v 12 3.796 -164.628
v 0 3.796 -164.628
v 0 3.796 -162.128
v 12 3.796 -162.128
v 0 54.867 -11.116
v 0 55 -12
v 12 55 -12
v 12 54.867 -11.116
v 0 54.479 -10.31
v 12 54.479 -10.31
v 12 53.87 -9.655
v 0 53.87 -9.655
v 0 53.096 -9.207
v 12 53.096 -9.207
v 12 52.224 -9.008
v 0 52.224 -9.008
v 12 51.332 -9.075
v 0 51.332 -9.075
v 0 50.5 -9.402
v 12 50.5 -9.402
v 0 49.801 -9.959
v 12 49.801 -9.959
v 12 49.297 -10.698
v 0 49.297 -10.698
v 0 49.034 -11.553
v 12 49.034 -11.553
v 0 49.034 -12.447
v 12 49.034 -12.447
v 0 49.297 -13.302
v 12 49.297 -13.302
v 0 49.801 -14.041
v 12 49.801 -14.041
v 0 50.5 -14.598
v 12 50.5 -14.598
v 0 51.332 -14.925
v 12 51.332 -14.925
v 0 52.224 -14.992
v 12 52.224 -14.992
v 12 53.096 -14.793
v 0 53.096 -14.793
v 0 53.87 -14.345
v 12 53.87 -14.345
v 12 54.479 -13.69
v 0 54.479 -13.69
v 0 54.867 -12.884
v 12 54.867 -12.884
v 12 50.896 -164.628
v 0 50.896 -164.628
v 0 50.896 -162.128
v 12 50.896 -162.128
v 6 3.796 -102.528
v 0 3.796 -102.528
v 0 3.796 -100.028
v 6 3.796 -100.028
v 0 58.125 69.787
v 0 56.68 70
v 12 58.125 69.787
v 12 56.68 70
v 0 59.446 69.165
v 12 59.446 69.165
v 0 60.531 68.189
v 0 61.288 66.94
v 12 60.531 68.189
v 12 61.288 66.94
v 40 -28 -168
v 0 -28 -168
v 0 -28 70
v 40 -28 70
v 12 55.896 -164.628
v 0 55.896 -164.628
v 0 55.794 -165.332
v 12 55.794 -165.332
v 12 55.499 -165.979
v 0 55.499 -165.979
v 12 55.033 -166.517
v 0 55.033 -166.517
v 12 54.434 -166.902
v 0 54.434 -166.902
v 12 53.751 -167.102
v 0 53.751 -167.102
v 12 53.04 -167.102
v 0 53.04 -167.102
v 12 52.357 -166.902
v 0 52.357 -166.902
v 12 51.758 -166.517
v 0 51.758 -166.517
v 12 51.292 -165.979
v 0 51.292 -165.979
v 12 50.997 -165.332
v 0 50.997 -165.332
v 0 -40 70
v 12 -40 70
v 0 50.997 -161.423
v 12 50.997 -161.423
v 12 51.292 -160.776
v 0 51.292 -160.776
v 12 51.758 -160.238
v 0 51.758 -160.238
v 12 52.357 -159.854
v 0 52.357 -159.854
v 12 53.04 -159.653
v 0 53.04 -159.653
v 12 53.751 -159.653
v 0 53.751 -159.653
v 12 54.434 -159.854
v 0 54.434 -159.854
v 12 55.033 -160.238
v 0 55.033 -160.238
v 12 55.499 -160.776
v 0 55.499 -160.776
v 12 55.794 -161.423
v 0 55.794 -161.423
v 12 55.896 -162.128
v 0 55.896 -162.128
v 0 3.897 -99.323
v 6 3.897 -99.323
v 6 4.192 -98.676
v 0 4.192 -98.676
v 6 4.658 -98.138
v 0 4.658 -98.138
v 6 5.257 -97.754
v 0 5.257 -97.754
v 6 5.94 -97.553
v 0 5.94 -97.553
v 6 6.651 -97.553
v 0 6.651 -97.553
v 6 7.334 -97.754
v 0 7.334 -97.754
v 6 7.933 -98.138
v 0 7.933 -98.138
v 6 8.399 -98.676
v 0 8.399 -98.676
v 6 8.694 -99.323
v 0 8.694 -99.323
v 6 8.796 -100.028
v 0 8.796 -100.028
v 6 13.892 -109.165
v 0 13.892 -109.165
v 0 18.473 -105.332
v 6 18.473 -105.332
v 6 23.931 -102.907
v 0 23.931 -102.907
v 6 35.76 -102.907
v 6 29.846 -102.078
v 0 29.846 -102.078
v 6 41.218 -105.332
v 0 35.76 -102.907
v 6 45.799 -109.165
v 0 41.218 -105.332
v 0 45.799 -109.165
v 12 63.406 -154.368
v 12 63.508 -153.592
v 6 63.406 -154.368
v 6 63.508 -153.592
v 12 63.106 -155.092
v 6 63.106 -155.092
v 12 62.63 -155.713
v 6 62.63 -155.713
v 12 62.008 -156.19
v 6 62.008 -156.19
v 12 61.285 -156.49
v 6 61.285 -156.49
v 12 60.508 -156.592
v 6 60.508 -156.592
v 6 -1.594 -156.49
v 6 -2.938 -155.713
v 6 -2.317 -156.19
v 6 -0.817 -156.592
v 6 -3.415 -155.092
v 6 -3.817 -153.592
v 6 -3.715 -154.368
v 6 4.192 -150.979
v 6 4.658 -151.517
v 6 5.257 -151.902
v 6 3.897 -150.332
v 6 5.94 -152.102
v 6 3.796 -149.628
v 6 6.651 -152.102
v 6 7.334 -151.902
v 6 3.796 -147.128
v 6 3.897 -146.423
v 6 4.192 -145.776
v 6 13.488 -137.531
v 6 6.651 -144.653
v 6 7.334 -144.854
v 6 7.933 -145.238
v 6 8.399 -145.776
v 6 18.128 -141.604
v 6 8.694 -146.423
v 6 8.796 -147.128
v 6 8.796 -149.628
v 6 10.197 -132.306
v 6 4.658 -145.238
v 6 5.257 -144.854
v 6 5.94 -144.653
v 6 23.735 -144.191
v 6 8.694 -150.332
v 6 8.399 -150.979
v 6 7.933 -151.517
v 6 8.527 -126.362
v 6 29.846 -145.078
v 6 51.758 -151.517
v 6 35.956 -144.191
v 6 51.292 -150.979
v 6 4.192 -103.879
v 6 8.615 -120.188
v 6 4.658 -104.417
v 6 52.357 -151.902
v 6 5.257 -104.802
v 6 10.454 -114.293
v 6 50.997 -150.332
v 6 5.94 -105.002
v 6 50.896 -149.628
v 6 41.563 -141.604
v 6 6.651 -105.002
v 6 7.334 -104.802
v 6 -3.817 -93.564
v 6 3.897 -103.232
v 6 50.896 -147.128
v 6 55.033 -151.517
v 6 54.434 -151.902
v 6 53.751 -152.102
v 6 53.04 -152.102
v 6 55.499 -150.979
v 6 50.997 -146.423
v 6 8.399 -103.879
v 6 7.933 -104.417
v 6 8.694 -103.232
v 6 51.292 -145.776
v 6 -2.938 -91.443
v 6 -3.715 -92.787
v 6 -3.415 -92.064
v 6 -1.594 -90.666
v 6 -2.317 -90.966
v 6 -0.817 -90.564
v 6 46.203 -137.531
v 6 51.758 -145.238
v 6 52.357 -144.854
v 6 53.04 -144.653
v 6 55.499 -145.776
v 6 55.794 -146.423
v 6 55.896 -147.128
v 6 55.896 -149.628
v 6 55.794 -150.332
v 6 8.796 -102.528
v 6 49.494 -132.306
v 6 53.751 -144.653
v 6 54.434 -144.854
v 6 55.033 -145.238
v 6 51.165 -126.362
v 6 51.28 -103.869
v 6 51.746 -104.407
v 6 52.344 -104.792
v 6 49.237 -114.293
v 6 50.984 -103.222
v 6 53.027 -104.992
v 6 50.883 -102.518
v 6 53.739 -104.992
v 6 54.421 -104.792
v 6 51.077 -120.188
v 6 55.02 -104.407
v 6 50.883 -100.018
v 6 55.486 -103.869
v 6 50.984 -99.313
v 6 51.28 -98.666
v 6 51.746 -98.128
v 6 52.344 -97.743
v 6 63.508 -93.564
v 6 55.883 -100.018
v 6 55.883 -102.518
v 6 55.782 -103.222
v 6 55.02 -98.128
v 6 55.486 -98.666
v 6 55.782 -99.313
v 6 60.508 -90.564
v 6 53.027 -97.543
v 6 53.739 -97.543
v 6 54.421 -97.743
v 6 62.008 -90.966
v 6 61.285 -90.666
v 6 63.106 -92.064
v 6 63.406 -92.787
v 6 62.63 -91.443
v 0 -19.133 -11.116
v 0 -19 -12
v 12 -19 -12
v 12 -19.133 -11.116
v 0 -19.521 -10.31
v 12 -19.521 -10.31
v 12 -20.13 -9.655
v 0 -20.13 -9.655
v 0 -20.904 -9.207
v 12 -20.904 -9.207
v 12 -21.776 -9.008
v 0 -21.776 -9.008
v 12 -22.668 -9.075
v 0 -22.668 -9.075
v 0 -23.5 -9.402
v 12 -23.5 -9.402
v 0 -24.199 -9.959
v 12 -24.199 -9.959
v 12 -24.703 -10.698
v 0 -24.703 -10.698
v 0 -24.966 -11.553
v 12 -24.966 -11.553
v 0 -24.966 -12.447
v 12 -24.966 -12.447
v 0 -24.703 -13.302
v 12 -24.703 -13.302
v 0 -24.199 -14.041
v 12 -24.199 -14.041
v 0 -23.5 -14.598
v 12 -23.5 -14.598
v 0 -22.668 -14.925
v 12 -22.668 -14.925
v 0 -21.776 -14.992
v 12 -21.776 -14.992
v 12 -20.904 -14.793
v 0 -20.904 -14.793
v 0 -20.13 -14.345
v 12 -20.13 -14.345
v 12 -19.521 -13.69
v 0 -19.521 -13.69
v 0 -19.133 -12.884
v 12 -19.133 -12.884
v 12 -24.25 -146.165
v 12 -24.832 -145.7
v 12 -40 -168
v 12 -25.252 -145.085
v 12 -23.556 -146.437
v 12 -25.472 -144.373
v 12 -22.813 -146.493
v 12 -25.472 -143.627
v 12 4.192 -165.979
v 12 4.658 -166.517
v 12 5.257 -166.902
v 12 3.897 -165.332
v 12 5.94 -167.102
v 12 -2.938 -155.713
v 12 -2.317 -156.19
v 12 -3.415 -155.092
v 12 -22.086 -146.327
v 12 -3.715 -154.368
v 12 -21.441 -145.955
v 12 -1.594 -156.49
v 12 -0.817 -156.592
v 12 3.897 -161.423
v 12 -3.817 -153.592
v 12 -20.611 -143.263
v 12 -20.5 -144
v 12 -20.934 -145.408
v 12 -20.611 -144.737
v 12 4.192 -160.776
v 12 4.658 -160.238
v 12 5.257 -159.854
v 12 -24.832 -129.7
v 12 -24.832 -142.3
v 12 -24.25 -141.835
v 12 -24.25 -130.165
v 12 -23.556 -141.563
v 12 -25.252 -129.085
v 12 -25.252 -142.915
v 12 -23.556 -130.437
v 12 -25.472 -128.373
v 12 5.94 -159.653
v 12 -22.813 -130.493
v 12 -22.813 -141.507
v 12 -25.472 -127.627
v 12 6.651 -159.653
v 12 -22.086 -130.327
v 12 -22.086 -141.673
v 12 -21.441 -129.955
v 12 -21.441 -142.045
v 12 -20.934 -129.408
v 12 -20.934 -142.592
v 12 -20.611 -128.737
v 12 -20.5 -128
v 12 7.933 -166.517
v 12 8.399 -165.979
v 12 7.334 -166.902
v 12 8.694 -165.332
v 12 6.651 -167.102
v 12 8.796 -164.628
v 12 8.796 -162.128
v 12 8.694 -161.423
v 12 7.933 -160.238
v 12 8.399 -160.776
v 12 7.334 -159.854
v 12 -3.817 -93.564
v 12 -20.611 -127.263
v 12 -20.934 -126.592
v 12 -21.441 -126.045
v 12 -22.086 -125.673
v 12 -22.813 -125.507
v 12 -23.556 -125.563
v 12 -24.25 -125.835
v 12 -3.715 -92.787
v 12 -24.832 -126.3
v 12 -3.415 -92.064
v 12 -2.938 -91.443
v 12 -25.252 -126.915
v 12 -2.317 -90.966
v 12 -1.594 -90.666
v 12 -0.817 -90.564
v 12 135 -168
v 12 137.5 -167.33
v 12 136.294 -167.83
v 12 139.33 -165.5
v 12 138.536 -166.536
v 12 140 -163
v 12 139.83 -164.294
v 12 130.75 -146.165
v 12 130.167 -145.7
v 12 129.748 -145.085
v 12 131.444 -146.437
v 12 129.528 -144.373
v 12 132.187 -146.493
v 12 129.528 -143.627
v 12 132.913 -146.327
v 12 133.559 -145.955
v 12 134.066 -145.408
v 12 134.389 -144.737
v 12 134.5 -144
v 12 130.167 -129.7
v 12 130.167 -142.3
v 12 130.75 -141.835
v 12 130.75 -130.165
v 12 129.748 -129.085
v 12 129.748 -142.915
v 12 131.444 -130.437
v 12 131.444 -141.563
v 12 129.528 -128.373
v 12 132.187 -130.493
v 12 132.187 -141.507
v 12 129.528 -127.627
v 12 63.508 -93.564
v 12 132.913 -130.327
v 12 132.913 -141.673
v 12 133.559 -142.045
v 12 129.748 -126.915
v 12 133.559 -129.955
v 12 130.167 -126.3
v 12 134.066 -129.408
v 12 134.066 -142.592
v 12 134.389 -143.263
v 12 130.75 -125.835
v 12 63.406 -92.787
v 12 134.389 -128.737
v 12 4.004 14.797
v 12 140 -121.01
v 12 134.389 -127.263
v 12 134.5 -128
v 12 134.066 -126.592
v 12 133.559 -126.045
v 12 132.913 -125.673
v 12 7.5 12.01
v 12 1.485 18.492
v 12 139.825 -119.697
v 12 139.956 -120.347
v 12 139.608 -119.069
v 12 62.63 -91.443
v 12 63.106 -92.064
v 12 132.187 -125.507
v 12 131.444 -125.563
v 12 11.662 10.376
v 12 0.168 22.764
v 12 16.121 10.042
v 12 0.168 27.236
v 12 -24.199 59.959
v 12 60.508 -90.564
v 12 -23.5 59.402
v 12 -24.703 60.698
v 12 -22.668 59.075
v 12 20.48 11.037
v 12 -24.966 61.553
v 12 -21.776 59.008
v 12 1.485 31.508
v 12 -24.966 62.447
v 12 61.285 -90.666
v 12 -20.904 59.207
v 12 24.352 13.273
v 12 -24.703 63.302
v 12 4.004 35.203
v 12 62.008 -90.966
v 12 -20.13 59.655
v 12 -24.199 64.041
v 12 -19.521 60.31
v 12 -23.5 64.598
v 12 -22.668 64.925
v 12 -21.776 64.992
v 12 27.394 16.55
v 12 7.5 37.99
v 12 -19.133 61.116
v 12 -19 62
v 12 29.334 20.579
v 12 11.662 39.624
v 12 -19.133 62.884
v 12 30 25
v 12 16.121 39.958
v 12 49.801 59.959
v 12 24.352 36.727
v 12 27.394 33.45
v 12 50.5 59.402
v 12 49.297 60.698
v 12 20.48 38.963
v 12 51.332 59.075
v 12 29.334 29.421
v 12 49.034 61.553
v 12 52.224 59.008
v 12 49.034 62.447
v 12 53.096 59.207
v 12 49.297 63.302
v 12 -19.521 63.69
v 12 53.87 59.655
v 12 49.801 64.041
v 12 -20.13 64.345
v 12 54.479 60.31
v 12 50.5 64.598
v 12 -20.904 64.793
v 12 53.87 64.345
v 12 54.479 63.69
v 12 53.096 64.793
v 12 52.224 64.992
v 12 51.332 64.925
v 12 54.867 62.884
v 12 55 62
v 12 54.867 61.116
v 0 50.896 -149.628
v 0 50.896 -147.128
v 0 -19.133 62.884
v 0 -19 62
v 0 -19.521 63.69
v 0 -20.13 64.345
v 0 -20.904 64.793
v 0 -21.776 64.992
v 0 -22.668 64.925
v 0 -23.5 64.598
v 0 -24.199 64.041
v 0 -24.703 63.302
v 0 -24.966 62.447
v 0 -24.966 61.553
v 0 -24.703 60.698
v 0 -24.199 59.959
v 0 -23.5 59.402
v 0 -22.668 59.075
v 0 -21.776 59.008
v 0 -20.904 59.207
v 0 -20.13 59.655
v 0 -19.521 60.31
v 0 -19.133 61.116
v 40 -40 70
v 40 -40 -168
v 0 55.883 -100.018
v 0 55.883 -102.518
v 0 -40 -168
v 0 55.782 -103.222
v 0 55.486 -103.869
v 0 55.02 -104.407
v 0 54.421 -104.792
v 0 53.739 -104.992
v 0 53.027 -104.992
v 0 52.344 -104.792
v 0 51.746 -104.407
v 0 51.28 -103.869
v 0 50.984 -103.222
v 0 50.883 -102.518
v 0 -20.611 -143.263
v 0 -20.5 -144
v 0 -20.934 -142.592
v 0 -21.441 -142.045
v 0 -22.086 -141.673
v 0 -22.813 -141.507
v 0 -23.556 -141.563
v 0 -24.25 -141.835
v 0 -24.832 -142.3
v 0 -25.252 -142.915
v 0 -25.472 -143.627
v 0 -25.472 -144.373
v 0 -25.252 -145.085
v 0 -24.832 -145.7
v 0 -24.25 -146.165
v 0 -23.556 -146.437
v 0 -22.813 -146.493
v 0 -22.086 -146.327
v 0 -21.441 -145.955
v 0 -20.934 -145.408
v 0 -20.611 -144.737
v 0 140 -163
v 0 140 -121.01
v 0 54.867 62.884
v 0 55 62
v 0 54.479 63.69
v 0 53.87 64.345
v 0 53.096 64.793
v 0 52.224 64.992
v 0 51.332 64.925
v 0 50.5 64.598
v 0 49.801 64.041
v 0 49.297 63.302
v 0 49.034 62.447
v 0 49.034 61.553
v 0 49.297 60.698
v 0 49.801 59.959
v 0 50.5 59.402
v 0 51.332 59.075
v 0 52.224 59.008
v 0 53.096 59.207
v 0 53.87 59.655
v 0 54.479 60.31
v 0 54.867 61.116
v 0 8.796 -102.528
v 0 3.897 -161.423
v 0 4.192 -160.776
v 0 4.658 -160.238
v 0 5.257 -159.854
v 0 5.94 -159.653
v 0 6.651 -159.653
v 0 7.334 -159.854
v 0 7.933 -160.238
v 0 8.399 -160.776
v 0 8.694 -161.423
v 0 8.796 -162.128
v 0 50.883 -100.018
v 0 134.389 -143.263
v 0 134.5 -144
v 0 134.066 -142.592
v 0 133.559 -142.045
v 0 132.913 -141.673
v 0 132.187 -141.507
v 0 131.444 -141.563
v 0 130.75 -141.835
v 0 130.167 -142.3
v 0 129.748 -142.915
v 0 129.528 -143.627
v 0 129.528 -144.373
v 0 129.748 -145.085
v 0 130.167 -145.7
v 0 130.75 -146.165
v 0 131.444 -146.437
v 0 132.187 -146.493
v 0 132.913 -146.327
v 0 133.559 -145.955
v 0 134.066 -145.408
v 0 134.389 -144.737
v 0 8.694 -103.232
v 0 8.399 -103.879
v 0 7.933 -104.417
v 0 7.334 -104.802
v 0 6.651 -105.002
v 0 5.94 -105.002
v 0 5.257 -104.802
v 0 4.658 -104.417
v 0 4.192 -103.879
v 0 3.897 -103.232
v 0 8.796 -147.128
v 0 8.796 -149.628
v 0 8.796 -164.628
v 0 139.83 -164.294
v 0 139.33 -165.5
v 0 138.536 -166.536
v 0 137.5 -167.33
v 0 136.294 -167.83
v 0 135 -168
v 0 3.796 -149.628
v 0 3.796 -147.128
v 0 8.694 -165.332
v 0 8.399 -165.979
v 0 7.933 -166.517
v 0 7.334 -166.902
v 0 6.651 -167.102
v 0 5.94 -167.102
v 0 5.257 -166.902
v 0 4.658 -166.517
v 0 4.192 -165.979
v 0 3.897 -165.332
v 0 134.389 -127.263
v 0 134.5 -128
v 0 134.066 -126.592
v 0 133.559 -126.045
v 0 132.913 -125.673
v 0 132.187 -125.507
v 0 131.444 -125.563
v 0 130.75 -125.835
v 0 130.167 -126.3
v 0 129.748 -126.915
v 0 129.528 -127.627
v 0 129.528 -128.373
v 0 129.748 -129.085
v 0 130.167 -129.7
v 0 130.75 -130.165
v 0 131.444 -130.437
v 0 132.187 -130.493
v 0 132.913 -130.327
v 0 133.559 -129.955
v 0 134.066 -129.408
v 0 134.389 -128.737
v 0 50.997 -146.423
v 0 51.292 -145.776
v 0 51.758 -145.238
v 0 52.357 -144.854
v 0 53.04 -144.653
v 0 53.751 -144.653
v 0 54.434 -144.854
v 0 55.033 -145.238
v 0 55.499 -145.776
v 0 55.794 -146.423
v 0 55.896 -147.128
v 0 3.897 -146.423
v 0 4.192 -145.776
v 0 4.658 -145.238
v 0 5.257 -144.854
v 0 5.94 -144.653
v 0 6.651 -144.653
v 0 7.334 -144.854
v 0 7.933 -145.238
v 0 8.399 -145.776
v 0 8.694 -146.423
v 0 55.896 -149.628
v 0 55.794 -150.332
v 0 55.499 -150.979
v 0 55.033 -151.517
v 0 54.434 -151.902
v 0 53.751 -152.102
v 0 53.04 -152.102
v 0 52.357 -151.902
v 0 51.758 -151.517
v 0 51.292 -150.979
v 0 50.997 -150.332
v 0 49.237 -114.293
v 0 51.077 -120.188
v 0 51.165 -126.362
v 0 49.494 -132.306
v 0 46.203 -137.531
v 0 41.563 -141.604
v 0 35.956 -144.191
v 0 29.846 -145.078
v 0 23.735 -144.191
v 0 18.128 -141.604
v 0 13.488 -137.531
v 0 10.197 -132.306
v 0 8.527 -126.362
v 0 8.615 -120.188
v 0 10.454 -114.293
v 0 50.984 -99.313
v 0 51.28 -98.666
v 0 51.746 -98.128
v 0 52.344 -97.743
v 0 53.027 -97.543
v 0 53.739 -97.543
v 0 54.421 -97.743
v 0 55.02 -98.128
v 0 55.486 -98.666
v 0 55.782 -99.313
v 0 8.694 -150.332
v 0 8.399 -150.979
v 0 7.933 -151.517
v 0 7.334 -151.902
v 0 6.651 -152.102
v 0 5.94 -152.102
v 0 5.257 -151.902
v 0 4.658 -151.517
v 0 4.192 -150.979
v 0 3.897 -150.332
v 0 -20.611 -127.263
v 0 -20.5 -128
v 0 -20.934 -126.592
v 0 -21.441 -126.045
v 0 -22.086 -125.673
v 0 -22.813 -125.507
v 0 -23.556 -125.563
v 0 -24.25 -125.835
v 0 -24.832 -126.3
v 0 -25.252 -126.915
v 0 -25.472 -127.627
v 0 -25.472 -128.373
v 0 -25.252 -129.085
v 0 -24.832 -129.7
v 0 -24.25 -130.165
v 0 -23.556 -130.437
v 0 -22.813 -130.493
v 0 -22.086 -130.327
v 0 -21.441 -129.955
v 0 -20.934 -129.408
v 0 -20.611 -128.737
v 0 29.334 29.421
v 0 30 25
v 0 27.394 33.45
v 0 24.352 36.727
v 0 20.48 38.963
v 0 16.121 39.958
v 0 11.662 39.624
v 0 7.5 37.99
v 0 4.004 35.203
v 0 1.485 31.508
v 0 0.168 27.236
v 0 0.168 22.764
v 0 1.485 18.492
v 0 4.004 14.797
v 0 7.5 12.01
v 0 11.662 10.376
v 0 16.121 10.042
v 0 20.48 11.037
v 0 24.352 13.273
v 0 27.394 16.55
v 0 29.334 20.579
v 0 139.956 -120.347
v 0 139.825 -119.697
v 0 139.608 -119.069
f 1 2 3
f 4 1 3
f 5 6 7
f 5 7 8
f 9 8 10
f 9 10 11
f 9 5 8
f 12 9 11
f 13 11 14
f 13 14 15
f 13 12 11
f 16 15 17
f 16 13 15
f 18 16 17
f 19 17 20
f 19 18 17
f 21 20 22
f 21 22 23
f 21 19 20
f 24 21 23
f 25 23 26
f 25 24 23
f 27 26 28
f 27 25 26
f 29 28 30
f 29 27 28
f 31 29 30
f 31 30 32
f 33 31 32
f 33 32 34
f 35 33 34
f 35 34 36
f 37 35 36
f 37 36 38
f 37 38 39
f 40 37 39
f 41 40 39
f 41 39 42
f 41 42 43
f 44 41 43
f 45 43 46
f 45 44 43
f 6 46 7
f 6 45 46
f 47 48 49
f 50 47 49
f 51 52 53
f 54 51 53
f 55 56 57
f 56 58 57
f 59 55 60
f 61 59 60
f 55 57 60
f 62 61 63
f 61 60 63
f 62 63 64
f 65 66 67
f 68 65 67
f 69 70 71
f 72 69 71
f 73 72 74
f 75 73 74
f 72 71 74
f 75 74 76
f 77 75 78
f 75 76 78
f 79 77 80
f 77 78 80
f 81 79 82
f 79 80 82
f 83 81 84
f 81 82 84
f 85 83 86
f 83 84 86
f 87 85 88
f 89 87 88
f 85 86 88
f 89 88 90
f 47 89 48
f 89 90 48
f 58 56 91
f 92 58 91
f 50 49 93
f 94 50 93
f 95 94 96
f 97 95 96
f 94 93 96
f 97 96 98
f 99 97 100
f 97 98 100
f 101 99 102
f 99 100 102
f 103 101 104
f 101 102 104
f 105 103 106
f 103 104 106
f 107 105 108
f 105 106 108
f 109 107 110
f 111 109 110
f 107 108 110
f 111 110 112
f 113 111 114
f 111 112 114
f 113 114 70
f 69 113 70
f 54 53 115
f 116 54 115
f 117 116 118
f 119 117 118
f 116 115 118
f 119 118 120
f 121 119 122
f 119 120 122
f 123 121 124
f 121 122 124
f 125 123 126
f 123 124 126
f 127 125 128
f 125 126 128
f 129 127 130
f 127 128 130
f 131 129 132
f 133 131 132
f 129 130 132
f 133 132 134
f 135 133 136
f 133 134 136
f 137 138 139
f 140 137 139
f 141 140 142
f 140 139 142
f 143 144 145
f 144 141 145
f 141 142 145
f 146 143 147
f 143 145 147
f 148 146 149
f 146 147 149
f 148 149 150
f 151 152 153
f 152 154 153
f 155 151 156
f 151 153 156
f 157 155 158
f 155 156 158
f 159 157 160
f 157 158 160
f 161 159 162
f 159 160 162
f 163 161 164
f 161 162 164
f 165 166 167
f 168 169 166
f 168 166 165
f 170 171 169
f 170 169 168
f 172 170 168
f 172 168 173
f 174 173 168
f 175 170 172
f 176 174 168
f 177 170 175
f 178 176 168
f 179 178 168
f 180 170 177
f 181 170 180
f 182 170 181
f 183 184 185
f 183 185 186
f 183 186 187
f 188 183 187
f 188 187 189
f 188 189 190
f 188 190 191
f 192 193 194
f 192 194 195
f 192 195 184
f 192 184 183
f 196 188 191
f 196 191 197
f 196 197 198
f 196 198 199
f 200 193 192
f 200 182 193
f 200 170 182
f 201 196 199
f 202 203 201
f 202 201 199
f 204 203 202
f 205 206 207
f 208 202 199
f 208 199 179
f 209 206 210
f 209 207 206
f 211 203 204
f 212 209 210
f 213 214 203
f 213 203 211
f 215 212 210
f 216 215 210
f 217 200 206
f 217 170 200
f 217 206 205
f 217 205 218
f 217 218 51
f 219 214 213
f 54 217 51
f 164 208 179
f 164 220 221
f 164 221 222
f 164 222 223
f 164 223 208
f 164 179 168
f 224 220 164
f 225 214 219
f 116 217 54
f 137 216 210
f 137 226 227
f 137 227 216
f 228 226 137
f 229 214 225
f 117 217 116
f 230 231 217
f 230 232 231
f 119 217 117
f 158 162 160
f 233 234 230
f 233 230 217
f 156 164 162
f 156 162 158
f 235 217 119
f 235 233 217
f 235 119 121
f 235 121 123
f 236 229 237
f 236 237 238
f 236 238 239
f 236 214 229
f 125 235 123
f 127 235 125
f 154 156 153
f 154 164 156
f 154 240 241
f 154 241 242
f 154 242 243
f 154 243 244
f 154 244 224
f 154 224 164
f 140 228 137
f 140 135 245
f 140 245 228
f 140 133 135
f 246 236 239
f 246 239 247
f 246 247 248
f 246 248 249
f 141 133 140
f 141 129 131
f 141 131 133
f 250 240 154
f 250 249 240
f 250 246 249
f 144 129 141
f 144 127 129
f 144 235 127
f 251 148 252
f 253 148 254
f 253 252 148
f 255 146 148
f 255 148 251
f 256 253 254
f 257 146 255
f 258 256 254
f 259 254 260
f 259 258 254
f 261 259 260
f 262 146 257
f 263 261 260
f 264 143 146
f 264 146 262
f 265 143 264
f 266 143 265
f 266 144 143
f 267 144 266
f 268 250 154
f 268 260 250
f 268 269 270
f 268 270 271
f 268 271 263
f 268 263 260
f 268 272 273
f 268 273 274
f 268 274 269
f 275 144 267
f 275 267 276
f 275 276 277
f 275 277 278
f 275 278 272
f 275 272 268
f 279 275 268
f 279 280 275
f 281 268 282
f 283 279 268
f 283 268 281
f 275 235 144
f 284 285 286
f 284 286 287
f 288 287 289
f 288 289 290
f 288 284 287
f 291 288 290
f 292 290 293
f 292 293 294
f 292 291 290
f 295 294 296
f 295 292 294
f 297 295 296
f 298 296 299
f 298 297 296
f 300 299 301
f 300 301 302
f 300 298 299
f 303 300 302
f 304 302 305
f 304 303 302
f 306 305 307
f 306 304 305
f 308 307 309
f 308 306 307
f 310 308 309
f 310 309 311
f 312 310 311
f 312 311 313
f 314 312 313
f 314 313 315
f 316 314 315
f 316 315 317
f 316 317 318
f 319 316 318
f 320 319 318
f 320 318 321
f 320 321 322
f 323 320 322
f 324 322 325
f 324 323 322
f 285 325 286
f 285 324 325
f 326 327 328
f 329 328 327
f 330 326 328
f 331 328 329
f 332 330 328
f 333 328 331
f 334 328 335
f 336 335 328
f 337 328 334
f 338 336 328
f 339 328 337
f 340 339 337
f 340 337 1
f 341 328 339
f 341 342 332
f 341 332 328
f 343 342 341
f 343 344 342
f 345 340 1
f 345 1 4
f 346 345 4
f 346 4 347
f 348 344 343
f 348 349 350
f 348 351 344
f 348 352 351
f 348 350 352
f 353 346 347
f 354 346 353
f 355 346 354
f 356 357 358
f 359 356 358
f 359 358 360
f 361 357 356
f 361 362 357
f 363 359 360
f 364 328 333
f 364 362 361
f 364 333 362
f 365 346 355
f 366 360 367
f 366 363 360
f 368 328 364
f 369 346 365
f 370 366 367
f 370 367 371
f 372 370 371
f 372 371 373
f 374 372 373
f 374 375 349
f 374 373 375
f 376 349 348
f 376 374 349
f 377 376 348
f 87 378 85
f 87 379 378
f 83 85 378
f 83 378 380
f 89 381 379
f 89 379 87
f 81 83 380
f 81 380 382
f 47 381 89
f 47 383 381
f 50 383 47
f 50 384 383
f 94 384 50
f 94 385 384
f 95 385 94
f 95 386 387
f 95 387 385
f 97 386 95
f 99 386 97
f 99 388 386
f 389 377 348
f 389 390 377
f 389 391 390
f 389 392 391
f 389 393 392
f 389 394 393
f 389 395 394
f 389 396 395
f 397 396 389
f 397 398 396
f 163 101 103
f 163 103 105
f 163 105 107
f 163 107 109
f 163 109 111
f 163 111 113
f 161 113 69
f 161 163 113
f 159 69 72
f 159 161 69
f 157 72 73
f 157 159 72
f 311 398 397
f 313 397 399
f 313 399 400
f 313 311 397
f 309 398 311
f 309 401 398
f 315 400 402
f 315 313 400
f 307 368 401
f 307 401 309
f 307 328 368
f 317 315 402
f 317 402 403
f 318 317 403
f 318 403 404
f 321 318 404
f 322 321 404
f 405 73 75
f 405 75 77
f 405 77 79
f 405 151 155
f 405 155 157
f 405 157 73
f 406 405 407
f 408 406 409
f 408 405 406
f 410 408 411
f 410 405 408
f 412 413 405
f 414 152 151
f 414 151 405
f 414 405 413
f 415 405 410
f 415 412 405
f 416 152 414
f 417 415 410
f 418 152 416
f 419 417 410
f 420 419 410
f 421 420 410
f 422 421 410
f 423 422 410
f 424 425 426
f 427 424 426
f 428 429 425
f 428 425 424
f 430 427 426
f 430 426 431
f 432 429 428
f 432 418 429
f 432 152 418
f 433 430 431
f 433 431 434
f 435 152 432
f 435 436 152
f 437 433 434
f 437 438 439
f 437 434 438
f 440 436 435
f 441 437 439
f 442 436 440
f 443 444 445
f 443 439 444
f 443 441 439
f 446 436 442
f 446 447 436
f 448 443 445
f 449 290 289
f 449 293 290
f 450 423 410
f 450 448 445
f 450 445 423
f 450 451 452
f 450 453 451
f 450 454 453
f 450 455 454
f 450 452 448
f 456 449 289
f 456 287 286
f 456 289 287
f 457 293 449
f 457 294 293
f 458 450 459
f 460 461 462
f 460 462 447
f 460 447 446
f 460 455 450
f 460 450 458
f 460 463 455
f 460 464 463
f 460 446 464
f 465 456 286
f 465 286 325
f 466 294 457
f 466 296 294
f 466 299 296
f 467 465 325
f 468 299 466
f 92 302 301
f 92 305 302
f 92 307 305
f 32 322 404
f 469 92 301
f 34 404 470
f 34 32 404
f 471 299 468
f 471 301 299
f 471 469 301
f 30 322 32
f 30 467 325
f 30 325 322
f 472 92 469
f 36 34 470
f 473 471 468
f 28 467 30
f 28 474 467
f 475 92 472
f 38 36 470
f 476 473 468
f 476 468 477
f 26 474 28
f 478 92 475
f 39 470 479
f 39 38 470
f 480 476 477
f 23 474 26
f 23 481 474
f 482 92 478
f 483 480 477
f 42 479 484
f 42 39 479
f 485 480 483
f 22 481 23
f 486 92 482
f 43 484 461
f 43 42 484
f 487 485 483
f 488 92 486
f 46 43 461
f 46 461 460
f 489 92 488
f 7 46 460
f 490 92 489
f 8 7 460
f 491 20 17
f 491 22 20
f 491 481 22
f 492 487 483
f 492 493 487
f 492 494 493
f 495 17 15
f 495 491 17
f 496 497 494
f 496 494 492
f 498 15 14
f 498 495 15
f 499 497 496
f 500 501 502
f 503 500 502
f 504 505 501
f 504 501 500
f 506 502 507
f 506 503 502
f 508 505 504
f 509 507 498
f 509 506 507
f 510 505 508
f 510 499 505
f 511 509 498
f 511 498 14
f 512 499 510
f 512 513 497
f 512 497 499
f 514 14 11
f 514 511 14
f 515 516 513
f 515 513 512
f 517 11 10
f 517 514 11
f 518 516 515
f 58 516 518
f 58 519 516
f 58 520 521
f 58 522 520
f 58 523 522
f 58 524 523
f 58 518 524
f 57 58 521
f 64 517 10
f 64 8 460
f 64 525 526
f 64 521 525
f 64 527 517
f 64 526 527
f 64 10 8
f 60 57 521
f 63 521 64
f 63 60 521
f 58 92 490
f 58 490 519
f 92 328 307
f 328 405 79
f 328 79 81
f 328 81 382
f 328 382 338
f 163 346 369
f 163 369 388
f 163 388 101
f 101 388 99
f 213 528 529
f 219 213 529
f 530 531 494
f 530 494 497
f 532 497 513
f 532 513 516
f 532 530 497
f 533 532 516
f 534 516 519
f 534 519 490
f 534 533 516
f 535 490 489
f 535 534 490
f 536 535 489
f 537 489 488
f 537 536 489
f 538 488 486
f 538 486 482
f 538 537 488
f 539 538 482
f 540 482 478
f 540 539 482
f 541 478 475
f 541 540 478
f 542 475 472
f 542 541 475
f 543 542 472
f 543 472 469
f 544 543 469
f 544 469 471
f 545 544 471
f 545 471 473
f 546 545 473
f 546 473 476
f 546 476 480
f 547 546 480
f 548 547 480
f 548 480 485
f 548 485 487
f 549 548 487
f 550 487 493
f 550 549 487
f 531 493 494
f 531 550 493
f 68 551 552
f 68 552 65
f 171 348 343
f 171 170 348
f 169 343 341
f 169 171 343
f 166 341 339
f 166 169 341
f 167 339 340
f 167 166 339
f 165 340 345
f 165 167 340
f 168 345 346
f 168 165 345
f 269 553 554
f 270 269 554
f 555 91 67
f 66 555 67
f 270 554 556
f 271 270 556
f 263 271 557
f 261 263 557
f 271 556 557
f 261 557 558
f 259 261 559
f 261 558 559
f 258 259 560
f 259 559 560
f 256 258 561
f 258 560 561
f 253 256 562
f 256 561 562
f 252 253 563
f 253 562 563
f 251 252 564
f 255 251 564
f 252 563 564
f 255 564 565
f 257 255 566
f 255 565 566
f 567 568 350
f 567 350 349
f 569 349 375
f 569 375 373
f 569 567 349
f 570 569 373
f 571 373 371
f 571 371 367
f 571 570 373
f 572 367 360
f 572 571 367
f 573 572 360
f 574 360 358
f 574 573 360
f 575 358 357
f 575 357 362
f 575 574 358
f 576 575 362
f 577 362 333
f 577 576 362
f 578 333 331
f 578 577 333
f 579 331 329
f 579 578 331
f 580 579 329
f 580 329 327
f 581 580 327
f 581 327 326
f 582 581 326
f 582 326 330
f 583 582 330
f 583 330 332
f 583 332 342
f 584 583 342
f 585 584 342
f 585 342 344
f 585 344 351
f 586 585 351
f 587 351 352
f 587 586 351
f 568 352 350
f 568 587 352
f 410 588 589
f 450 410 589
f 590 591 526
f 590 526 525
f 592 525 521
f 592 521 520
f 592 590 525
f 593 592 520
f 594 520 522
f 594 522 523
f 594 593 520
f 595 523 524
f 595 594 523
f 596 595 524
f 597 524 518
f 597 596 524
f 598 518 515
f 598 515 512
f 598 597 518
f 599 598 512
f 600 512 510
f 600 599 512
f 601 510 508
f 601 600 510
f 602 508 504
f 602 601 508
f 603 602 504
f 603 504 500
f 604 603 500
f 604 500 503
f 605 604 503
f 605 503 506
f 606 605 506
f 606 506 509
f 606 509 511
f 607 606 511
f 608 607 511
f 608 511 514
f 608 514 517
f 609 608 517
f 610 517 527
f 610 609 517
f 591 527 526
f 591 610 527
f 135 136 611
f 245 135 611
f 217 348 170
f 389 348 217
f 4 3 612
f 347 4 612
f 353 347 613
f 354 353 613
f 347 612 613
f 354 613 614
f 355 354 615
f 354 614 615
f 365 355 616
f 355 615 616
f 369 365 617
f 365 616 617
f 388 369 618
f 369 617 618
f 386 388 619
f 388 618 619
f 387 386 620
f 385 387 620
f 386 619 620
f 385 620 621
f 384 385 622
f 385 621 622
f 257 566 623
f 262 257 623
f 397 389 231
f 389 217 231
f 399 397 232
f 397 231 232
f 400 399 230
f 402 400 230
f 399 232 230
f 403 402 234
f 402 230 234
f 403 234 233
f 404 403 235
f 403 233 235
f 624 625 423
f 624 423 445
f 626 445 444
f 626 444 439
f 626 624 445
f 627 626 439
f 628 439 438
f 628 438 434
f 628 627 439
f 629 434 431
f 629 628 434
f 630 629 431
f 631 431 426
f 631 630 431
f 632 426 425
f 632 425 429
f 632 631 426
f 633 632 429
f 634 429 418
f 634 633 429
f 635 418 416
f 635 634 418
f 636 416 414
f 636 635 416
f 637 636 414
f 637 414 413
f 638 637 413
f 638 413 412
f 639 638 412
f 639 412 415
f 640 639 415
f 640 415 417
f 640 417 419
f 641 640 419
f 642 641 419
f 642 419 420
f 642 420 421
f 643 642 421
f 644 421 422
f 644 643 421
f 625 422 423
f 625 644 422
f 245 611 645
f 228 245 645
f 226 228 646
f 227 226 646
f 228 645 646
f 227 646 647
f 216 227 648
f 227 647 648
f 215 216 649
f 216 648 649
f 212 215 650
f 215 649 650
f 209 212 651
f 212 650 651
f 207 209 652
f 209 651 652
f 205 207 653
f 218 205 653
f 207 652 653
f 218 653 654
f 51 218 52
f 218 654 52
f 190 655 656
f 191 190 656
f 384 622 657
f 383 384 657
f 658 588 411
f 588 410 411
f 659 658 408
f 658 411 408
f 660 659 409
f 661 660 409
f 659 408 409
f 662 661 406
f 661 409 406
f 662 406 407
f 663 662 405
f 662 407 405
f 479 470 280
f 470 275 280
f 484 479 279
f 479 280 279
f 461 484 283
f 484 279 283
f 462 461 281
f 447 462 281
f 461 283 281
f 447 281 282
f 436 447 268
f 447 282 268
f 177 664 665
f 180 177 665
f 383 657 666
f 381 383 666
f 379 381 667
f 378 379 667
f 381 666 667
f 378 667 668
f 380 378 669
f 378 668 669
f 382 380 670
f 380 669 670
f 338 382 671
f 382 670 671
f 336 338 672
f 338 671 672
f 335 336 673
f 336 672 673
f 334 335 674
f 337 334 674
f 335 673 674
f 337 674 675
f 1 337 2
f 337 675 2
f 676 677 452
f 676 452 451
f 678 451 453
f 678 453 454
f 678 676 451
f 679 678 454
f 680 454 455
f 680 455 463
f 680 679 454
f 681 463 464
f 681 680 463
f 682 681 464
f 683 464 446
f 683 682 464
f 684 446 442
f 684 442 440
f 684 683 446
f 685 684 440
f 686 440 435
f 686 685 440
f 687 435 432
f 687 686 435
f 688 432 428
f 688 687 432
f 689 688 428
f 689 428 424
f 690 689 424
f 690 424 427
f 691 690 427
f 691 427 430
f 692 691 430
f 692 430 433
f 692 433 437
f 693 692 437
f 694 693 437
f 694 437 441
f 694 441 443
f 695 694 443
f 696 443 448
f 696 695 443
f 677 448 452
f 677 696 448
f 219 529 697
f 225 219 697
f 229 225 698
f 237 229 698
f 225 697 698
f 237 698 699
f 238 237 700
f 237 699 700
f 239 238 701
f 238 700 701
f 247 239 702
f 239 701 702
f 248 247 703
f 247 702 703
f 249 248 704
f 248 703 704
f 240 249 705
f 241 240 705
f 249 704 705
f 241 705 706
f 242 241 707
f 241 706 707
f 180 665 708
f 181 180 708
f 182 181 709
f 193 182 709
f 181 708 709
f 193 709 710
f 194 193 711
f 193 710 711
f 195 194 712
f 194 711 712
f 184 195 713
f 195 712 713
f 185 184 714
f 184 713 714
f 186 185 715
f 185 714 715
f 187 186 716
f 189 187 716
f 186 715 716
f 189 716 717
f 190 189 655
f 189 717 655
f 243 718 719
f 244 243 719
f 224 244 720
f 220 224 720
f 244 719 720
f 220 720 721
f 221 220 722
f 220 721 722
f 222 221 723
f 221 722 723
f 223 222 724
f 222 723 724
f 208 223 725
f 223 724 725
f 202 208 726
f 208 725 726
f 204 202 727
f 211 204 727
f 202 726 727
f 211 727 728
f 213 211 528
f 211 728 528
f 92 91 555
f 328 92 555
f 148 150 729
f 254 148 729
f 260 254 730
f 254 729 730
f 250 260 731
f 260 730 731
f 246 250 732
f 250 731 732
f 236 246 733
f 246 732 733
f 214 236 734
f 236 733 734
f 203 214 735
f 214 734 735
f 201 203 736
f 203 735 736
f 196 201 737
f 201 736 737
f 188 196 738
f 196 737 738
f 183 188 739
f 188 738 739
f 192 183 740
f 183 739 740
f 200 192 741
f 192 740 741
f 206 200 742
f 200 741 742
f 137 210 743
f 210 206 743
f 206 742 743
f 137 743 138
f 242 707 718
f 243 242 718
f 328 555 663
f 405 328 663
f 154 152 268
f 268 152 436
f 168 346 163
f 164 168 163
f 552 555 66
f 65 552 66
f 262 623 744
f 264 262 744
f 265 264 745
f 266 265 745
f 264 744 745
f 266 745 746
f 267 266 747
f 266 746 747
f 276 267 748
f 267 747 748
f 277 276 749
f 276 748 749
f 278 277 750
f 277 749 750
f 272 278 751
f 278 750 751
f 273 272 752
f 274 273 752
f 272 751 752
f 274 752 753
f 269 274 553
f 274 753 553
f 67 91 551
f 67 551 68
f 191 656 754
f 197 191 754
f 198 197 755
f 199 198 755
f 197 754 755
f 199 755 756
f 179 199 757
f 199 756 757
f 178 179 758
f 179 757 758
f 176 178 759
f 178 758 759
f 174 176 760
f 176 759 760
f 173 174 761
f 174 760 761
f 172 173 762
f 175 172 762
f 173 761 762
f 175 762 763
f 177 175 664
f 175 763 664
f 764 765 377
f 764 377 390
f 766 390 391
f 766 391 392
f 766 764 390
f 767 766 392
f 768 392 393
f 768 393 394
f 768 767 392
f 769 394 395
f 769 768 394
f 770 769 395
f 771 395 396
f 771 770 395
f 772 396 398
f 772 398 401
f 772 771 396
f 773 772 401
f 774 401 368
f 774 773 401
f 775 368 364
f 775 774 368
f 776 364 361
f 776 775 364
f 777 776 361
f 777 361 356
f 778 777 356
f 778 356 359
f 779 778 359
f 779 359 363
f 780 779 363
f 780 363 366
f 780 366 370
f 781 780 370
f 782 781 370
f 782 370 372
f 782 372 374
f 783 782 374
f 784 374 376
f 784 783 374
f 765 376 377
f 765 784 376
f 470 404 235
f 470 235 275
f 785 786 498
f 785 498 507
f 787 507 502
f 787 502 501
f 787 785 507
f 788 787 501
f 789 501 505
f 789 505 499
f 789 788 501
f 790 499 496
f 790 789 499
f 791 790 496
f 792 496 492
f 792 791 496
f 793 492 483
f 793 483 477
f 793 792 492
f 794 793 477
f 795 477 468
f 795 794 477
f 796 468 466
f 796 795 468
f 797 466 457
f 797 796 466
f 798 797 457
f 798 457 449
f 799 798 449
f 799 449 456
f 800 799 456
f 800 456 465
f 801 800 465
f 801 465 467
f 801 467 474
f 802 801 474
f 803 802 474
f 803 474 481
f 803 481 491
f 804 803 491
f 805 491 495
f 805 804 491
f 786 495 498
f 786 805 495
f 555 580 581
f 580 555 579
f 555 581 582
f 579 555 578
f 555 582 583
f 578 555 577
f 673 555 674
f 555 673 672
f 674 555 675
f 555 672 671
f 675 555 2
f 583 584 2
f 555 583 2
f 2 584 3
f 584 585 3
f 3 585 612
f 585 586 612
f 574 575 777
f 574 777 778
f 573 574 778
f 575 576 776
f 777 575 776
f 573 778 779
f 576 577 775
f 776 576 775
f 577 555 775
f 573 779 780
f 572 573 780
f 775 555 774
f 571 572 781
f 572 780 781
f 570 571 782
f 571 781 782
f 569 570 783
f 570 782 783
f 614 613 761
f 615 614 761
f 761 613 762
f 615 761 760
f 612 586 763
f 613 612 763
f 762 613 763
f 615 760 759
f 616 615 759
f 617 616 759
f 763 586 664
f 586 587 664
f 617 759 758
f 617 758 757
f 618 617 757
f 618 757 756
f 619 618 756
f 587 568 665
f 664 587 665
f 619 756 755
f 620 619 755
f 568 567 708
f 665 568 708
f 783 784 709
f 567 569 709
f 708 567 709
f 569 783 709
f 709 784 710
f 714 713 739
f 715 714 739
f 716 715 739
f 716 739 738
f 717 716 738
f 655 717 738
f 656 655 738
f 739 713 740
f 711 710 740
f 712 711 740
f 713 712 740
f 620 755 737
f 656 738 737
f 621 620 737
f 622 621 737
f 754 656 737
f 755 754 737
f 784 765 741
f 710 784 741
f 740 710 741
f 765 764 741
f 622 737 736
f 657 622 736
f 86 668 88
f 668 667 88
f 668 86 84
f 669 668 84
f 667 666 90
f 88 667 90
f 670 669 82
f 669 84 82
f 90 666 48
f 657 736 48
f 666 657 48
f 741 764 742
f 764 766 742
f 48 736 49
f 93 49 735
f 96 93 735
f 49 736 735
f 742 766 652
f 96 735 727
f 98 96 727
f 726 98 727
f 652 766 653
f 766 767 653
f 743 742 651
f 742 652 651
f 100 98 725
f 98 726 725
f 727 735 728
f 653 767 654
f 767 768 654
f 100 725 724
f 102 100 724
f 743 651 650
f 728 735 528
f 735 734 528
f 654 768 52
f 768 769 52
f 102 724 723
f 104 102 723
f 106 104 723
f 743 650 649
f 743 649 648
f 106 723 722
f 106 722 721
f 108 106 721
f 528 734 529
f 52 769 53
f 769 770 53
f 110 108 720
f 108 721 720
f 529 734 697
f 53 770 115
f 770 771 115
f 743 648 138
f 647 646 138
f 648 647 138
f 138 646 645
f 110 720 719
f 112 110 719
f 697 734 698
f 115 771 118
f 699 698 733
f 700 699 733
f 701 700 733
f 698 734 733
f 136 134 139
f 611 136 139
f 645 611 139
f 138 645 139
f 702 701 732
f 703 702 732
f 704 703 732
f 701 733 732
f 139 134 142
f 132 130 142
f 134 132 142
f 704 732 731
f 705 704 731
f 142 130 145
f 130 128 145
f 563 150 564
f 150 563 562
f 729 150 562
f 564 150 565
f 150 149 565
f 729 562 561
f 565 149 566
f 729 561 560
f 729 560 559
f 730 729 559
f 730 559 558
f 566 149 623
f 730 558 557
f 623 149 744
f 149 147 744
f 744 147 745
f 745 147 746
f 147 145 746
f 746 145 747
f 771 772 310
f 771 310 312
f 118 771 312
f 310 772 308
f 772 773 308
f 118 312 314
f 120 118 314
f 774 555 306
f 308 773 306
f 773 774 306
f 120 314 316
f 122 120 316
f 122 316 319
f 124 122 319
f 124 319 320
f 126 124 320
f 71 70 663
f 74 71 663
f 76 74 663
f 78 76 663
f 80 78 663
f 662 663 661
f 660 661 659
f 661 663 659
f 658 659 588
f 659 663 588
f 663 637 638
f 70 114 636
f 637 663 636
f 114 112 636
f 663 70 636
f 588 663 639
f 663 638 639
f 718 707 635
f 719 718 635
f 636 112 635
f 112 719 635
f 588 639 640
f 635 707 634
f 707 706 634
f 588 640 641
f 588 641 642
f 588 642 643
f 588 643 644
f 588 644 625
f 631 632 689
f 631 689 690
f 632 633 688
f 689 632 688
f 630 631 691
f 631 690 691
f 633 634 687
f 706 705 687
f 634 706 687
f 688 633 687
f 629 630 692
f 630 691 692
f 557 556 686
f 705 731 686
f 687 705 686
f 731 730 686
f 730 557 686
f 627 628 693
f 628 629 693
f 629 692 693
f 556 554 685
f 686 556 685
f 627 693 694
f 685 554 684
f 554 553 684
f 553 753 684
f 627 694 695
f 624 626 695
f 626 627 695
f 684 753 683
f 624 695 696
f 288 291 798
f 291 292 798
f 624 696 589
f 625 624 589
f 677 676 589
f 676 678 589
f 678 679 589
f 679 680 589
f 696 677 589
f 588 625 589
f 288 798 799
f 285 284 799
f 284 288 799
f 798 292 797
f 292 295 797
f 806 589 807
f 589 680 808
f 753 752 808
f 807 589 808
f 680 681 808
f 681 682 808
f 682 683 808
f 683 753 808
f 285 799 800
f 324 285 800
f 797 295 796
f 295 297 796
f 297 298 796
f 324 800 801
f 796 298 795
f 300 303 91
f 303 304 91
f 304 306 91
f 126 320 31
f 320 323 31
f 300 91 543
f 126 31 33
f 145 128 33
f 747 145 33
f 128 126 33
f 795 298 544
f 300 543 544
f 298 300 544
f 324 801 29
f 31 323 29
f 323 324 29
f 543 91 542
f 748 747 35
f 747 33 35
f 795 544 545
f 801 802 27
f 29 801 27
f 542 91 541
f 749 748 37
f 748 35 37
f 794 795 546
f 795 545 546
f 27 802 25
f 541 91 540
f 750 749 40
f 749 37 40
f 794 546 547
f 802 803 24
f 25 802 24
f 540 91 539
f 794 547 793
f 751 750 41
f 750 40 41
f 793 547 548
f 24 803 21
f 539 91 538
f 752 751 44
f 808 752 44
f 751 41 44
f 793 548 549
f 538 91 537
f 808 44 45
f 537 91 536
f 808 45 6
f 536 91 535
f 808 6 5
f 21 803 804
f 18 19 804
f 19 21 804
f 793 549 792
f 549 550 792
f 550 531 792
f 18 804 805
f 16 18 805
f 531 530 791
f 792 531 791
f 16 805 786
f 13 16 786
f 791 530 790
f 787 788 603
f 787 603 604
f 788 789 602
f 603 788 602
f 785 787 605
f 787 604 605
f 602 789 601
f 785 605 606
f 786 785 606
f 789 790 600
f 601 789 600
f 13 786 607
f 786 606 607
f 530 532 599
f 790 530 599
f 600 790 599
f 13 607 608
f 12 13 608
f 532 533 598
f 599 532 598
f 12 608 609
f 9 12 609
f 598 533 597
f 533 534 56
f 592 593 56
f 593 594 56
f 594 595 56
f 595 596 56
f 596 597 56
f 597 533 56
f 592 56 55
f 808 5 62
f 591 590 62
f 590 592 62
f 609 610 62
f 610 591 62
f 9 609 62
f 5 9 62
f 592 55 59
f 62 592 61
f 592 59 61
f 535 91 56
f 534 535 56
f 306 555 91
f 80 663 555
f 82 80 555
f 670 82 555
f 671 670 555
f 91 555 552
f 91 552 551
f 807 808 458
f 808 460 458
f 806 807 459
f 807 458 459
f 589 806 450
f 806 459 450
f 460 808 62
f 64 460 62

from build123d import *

# Parameters (mm, degrees)
F0_R     = 2.5
F0_R_2   = 3
F0_R_3   = 15
F1_DEPTH = 12
F2_R     = 5
F3_W     = 12
F3_H     = 238
F4_DEPTH = 40
F5_W     = 67.325378561
F5_H     = 66.0278675795
F5_R     = 21.5
F6_DEPTH = 6
F7_R     = 3


with BuildPart() as f1:
    # F0 (on Right) → F1 (new body)
    with BuildSketch(Plane.YZ):
        Polygon((60, 70), (-40, 70), (-40, -155), (-40, -168), (140, -168), (140, -155), (140, -120), align=None)
        with Locations((-22.9998427761, -144.0000000011)):
            Circle(F0_R, mode=Mode.SUBTRACT)
        with Locations((-22.9998427761, -128.0000000011)):
            Circle(F0_R, mode=Mode.SUBTRACT)
        with BuildLine():
            ThreePointArc((8.7955255248, -164.6278196573), (6.2955255248, -167.1278196573), (3.7955255248, -164.6278196573))
            Line((3.7955255248, -164.6278196573), (3.7955255248, -162.1278196573))
            ThreePointArc((3.7955255248, -162.1278196573), (6.2955255248, -159.6278196573), (8.7955255248, -162.1278196573))
            Line((8.7955255248, -162.1278196573), (8.7955255248, -164.6278196573))
        make_face(mode=Mode.SUBTRACT)
        with BuildLine():
            ThreePointArc((3.7955255248, -147.1278196573), (6.2955255248, -144.6278196573), (8.7955255248, -147.1278196573))
            Line((8.7955255248, -147.1278196573), (8.7955255248, -149.6278196573))
            ThreePointArc((8.7955255248, -149.6278196573), (6.2955255248, -152.1278196573), (3.7955255248, -149.6278196573))
            Line((3.7955255248, -149.6278196573), (3.7955255248, -147.1278196573))
        make_face(mode=Mode.SUBTRACT)
        with BuildLine():
            Line((-15.2751309797, -109.1645396501), (-15.2751309797, -29.1645396501))
            Line((-15.2751309797, -29.1645396501), (80.0356410052, -29.1645396501))
            Line((80.0356410052, -29.1645396501), (113.7198515315, -109.1645396501))
            Line((113.7198515315, -109.1645396501), (45.7988123157, -109.1645396501))
            ThreePointArc((45.7988123157, -109.1645396501), (49.9109892125, -115.8559567346), (51.3455255248, -123.5778196573))
            ThreePointArc((51.3455255248, -123.5778196573), (22.123662602, -143.643283345), (13.8922387339, -109.1645396501))
            Line((13.8922387339, -109.1645396501), (-15.2751309797, -109.1645396501))
        make_face(mode=Mode.SUBTRACT)
        with BuildLine():
            ThreePointArc((55.8955255248, -164.6278196573), (53.3955255248, -167.1278196573), (50.8955255248, -164.6278196573))
            Line((50.8955255248, -164.6278196573), (50.8955255248, -162.1278196573))
            ThreePointArc((50.8955255248, -162.1278196573), (53.3955255248, -159.6278196573), (55.8955255248, -162.1278196573))
            Line((55.8955255248, -162.1278196573), (55.8955255248, -164.6278196573))
        make_face(mode=Mode.SUBTRACT)
        with BuildLine():
            ThreePointArc((50.8955255248, -147.1278196573), (53.3955255248, -144.6278196573), (55.8955255248, -147.1278196573))
            Line((55.8955255248, -147.1278196573), (55.8955255248, -149.6278196573))
            ThreePointArc((55.8955255248, -149.6278196573), (53.3955255248, -152.1278196573), (50.8955255248, -149.6278196573))
            Line((50.8955255248, -149.6278196573), (50.8955255248, -147.1278196573))
        make_face(mode=Mode.SUBTRACT)
        with Locations((132, -144)):
            Circle(F0_R, mode=Mode.SUBTRACT)
        with Locations((132, -128)):
            Circle(F0_R, mode=Mode.SUBTRACT)
        with Locations((-22, -12)):
            Circle(F0_R_2, mode=Mode.SUBTRACT)
        with Locations((-22, 62)):
            Circle(F0_R_2, mode=Mode.SUBTRACT)
        with Locations((15, 25)):
            Circle(F0_R_3, mode=Mode.SUBTRACT)
        with Locations((52, -12)):
            Circle(F0_R_2, mode=Mode.SUBTRACT)
        with Locations((52, 62)):
            Circle(F0_R_2, mode=Mode.SUBTRACT)
        with BuildLine():
            Line((80.0356410052, -29.1645396501), (-15.2751309797, -29.1645396501))
            Line((-15.2751309797, -29.1645396501), (-15.2751309797, -109.1645396501))
            Line((-15.2751309797, -109.1645396501), (13.8922387339, -109.1645396501))
            ThreePointArc((13.8922387339, -109.1645396501), (29.8455255248, -102.0778196573), (45.7988123157, -109.1645396501))
            Line((45.7988123157, -109.1645396501), (113.7198515315, -109.1645396501))
            Line((113.7198515315, -109.1645396501), (80.0356410052, -29.1645396501))
        make_face()
        with BuildLine():
            ThreePointArc((8.7955255248, -102.5278196573), (6.2955255248, -105.0278196573), (3.7955255248, -102.5278196573))
            Line((3.7955255248, -102.5278196573), (3.7955255248, -100.0278196573))
            ThreePointArc((3.7955255248, -100.0278196573), (6.2955255248, -97.5278196573), (8.7955255248, -100.0278196573))
            Line((8.7955255248, -100.0278196573), (8.7955255248, -102.5278196573))
        make_face(mode=Mode.SUBTRACT)
        with BuildLine():
            ThreePointArc((55.8827681233, -102.5175169361), (53.3827681233, -105.0175169361), (50.8827681233, -102.5175169361))
            Line((50.8827681233, -102.5175169361), (50.8827681233, -100.0175169361))
            ThreePointArc((50.8827681233, -100.0175169361), (53.3827681233, -97.5175169361), (55.8827681233, -100.0175169361))
            Line((55.8827681233, -100.0175169361), (55.8827681233, -102.5175169361))
        make_face(mode=Mode.SUBTRACT)
    extrude(amount=F1_DEPTH)

    # F2
    f2_edges = [f1.edges().sort_by_distance(p)[0] for p in [
        (6, 60, 70),
        (6, 140, -120),
        (6, 140, -168),
    ]]
    fillet(f2_edges, radius=F2_R)

    # F5 (on face) → F6 (cut)
    with BuildSketch(Plane.YZ.offset(12)):
        with Locations((29.8455255248, -123.5778196573)):
            Rectangle(F5_W, F5_H)
        with BuildLine():
            Line((3.7955255248, -149.6278196573), (3.7955255248, -147.1278196573))
            ThreePointArc((3.7955255248, -147.1278196573), (6.2955255248, -144.6278196573), (8.7955255248, -147.1278196573))
            Line((8.7955255248, -147.1278196573), (8.7955255248, -149.6278196573))
            ThreePointArc((8.7955255248, -149.6278196573), (6.2955255248, -152.1278196573), (3.7955255248, -149.6278196573))
        make_face(mode=Mode.SUBTRACT)
        with Locations((29.8455255248, -123.5778196573)):
            Circle(F5_R, mode=Mode.SUBTRACT)
        with BuildLine():
            ThreePointArc((8.7955255248, -102.5278196573), (6.2955255248, -105.0278196573), (3.7955255248, -102.5278196573))
            Line((3.7955255248, -102.5278196573), (3.7955255248, -100.0278196573))
            ThreePointArc((3.7955255248, -100.0278196573), (6.2955255248, -97.5278196573), (8.7955255248, -100.0278196573))
            Line((8.7955255248, -100.0278196573), (8.7955255248, -102.5278196573))
        make_face(mode=Mode.SUBTRACT)
        with BuildLine():
            ThreePointArc((50.8955255248, -147.1278196573), (53.3955255248, -144.6278196573), (55.8955255248, -147.1278196573))
            Line((55.8955255248, -147.1278196573), (55.8955255248, -149.6278196573))
            ThreePointArc((55.8955255248, -149.6278196573), (53.3955255248, -152.1278196573), (50.8955255248, -149.6278196573))
            Line((50.8955255248, -149.6278196573), (50.8955255248, -147.1278196573))
        make_face(mode=Mode.SUBTRACT)
        with BuildLine():
            ThreePointArc((55.8827681233, -102.5175169361), (53.3827681233, -105.0175169361), (50.8827681233, -102.5175169361))
            Line((50.8827681233, -102.5175169361), (50.8827681233, -100.0175169361))
            ThreePointArc((50.8827681233, -100.0175169361), (53.3827681233, -97.5175169361), (55.8827681233, -100.0175169361))
            Line((55.8827681233, -100.0175169361), (55.8827681233, -102.5175169361))
        make_face(mode=Mode.SUBTRACT)
    extrude(amount=-F6_DEPTH, mode=Mode.SUBTRACT)

    # F7
    f7_edges = [f1.edges().sort_by_distance(p)[0] for p in [
        (9, -3.817164, -156.591753),
        (9, 63.508215, -156.591753),
        (9, 63.508215, -90.563886),
        (9, -3.817164, -90.563886),
    ]]
    fillet(f7_edges, radius=F7_R)


with BuildPart() as f4:
    # F3 (on Right) → F4 (new body)
    with BuildSketch(Plane.YZ):
        with Locations((-34, -49)):
            Rectangle(F3_W, F3_H)
    extrude(amount=F4_DEPTH)


solid = Compound([f1.part, f4.part])
